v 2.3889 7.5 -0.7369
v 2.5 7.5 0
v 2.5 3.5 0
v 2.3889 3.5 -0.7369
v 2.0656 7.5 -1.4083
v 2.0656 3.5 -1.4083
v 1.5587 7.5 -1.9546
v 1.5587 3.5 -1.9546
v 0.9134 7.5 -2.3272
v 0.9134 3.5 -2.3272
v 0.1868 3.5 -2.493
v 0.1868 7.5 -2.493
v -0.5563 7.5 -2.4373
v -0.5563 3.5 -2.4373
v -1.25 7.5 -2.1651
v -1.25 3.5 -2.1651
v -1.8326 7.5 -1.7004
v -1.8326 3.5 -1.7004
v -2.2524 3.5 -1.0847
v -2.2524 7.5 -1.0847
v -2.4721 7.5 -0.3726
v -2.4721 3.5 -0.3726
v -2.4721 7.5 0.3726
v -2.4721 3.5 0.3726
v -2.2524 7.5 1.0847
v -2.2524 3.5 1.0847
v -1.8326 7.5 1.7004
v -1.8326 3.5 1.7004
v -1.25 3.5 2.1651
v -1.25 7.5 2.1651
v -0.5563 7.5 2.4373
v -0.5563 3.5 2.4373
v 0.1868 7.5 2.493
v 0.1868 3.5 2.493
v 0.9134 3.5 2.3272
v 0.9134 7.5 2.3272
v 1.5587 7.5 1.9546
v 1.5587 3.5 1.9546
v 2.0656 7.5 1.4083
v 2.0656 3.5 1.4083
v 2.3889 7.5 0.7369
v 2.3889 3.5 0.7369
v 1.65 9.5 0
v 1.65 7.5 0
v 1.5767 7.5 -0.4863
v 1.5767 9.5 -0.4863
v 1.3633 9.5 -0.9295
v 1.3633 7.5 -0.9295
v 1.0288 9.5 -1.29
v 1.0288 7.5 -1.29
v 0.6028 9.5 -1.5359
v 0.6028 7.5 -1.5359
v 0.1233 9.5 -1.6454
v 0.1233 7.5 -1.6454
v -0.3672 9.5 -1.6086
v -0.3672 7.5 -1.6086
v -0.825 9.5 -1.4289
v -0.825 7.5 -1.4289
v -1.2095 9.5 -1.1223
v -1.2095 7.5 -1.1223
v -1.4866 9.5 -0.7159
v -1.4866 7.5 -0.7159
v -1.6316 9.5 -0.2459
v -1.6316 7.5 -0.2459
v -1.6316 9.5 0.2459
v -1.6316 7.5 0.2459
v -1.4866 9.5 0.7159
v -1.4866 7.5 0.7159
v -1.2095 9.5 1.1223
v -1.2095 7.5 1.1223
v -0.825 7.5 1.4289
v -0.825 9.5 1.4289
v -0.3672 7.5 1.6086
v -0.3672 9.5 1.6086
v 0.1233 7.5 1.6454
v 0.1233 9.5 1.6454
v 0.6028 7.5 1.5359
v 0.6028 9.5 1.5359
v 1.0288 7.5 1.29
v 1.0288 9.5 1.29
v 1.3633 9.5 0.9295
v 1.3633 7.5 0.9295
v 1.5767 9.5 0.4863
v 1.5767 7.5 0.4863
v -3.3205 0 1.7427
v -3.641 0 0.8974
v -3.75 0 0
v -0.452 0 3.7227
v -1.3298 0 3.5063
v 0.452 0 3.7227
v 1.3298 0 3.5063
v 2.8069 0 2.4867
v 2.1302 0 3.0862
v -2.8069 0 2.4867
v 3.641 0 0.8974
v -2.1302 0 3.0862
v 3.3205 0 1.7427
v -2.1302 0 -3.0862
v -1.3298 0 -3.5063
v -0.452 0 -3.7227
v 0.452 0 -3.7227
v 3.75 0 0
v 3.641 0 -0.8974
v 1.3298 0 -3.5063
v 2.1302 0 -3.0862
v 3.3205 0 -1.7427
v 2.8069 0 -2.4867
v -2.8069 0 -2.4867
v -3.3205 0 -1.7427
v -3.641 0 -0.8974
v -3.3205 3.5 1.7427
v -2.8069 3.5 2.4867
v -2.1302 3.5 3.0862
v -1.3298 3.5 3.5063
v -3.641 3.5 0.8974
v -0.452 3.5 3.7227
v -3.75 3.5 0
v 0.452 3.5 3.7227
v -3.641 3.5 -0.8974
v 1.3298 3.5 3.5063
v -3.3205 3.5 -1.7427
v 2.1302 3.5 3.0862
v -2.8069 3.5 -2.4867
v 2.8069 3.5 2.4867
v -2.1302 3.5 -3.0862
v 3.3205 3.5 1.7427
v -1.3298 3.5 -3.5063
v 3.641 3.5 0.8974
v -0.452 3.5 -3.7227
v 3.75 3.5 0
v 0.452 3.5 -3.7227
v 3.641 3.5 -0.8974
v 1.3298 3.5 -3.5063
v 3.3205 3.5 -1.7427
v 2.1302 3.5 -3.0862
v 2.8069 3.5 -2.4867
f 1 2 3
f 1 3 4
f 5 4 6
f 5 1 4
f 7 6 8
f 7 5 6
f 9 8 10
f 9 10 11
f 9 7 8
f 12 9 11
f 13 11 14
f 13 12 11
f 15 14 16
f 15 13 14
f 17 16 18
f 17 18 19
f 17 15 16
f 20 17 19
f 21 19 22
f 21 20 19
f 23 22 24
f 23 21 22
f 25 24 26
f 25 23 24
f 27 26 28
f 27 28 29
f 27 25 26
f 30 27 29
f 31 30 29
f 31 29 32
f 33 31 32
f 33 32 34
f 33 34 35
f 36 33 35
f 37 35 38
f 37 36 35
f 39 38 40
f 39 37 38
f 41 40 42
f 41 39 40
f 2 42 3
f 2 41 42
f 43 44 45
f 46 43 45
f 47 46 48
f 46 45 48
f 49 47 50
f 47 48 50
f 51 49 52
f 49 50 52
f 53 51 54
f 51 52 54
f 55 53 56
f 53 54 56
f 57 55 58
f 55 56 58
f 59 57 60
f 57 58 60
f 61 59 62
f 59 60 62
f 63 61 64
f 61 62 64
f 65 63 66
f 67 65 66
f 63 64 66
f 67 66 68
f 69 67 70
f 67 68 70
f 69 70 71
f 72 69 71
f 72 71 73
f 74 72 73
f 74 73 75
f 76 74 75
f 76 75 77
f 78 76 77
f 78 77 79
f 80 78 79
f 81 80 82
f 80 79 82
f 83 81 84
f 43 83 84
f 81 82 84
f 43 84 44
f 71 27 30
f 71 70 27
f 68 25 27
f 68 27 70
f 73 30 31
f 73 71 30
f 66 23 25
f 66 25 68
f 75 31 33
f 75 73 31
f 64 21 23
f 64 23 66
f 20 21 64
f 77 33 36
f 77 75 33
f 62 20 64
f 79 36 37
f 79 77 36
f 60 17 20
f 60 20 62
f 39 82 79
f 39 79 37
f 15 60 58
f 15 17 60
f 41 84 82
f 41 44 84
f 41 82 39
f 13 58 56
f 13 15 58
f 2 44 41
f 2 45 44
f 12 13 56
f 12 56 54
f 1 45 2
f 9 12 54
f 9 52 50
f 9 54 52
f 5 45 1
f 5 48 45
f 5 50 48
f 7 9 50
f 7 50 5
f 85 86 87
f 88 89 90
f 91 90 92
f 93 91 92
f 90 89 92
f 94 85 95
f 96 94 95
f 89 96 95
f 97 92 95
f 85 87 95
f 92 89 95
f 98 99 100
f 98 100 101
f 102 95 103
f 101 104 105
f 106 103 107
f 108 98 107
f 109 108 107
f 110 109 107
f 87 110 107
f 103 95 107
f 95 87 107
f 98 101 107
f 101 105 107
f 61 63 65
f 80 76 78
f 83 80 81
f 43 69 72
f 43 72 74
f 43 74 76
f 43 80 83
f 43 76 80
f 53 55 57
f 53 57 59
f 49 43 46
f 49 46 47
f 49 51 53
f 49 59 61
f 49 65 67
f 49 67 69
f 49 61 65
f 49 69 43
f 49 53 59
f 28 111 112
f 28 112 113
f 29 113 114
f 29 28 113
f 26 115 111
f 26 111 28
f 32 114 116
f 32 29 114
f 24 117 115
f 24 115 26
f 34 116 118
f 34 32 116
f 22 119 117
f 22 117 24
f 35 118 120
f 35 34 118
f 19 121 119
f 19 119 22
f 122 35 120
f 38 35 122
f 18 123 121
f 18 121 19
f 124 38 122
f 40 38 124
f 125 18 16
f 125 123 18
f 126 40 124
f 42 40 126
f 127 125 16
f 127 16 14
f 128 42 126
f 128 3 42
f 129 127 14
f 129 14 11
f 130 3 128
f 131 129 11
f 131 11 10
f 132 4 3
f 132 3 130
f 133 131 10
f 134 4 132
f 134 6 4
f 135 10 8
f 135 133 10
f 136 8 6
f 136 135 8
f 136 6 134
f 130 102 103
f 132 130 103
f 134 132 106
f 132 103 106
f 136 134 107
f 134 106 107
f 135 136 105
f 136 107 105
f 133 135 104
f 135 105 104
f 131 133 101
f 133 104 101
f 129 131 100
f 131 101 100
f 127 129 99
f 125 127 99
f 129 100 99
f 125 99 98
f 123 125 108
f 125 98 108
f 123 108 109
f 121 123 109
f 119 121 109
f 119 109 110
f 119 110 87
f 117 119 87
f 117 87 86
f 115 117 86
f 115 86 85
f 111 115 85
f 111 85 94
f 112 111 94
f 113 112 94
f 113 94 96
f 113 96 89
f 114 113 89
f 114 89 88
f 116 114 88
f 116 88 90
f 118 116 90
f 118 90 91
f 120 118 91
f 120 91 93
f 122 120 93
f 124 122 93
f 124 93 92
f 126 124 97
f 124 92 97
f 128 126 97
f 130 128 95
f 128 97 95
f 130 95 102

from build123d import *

# Parameters (mm, degrees)
SKETCH1_R           = 3.75
BOSS_EXTRUDE1_DEPTH = 7.5
SKETCH2_R           = 3.75
SKETCH2_R_2         = 2.5
CUT_EXTRUDE1_DEPTH  = 4
SKETCH3_R           = 1.65
BOSS_EXTRUDE2_DEPTH = 2


with BuildPart() as part:
    # Sketch1 → Boss-Extrude1 (new body)
    with BuildSketch(Plane(origin=(0, 0, 0), x_dir=(1, 0, 0), z_dir=(0, 1, 0))):
        Circle(SKETCH1_R)
    extrude(amount=BOSS_EXTRUDE1_DEPTH)

    # Sketch2 → Cut-Extrude1 (cut)
    with BuildSketch(Plane(origin=(0, 7.5, 0), x_dir=(1, 0, 0), z_dir=(0, 1, 0))):
        Circle(SKETCH2_R)
        Circle(SKETCH2_R_2, mode=Mode.SUBTRACT)
    extrude(amount=-CUT_EXTRUDE1_DEPTH, mode=Mode.SUBTRACT)

    # Sketch3 → Boss-Extrude2 (add)
    with BuildSketch(Plane(origin=(0, 7.5, 0), x_dir=(1, 0, 0), z_dir=(0, 1, 0))):
        Circle(SKETCH3_R)
    extrude(amount=BOSS_EXTRUDE2_DEPTH)


solid = part.part
